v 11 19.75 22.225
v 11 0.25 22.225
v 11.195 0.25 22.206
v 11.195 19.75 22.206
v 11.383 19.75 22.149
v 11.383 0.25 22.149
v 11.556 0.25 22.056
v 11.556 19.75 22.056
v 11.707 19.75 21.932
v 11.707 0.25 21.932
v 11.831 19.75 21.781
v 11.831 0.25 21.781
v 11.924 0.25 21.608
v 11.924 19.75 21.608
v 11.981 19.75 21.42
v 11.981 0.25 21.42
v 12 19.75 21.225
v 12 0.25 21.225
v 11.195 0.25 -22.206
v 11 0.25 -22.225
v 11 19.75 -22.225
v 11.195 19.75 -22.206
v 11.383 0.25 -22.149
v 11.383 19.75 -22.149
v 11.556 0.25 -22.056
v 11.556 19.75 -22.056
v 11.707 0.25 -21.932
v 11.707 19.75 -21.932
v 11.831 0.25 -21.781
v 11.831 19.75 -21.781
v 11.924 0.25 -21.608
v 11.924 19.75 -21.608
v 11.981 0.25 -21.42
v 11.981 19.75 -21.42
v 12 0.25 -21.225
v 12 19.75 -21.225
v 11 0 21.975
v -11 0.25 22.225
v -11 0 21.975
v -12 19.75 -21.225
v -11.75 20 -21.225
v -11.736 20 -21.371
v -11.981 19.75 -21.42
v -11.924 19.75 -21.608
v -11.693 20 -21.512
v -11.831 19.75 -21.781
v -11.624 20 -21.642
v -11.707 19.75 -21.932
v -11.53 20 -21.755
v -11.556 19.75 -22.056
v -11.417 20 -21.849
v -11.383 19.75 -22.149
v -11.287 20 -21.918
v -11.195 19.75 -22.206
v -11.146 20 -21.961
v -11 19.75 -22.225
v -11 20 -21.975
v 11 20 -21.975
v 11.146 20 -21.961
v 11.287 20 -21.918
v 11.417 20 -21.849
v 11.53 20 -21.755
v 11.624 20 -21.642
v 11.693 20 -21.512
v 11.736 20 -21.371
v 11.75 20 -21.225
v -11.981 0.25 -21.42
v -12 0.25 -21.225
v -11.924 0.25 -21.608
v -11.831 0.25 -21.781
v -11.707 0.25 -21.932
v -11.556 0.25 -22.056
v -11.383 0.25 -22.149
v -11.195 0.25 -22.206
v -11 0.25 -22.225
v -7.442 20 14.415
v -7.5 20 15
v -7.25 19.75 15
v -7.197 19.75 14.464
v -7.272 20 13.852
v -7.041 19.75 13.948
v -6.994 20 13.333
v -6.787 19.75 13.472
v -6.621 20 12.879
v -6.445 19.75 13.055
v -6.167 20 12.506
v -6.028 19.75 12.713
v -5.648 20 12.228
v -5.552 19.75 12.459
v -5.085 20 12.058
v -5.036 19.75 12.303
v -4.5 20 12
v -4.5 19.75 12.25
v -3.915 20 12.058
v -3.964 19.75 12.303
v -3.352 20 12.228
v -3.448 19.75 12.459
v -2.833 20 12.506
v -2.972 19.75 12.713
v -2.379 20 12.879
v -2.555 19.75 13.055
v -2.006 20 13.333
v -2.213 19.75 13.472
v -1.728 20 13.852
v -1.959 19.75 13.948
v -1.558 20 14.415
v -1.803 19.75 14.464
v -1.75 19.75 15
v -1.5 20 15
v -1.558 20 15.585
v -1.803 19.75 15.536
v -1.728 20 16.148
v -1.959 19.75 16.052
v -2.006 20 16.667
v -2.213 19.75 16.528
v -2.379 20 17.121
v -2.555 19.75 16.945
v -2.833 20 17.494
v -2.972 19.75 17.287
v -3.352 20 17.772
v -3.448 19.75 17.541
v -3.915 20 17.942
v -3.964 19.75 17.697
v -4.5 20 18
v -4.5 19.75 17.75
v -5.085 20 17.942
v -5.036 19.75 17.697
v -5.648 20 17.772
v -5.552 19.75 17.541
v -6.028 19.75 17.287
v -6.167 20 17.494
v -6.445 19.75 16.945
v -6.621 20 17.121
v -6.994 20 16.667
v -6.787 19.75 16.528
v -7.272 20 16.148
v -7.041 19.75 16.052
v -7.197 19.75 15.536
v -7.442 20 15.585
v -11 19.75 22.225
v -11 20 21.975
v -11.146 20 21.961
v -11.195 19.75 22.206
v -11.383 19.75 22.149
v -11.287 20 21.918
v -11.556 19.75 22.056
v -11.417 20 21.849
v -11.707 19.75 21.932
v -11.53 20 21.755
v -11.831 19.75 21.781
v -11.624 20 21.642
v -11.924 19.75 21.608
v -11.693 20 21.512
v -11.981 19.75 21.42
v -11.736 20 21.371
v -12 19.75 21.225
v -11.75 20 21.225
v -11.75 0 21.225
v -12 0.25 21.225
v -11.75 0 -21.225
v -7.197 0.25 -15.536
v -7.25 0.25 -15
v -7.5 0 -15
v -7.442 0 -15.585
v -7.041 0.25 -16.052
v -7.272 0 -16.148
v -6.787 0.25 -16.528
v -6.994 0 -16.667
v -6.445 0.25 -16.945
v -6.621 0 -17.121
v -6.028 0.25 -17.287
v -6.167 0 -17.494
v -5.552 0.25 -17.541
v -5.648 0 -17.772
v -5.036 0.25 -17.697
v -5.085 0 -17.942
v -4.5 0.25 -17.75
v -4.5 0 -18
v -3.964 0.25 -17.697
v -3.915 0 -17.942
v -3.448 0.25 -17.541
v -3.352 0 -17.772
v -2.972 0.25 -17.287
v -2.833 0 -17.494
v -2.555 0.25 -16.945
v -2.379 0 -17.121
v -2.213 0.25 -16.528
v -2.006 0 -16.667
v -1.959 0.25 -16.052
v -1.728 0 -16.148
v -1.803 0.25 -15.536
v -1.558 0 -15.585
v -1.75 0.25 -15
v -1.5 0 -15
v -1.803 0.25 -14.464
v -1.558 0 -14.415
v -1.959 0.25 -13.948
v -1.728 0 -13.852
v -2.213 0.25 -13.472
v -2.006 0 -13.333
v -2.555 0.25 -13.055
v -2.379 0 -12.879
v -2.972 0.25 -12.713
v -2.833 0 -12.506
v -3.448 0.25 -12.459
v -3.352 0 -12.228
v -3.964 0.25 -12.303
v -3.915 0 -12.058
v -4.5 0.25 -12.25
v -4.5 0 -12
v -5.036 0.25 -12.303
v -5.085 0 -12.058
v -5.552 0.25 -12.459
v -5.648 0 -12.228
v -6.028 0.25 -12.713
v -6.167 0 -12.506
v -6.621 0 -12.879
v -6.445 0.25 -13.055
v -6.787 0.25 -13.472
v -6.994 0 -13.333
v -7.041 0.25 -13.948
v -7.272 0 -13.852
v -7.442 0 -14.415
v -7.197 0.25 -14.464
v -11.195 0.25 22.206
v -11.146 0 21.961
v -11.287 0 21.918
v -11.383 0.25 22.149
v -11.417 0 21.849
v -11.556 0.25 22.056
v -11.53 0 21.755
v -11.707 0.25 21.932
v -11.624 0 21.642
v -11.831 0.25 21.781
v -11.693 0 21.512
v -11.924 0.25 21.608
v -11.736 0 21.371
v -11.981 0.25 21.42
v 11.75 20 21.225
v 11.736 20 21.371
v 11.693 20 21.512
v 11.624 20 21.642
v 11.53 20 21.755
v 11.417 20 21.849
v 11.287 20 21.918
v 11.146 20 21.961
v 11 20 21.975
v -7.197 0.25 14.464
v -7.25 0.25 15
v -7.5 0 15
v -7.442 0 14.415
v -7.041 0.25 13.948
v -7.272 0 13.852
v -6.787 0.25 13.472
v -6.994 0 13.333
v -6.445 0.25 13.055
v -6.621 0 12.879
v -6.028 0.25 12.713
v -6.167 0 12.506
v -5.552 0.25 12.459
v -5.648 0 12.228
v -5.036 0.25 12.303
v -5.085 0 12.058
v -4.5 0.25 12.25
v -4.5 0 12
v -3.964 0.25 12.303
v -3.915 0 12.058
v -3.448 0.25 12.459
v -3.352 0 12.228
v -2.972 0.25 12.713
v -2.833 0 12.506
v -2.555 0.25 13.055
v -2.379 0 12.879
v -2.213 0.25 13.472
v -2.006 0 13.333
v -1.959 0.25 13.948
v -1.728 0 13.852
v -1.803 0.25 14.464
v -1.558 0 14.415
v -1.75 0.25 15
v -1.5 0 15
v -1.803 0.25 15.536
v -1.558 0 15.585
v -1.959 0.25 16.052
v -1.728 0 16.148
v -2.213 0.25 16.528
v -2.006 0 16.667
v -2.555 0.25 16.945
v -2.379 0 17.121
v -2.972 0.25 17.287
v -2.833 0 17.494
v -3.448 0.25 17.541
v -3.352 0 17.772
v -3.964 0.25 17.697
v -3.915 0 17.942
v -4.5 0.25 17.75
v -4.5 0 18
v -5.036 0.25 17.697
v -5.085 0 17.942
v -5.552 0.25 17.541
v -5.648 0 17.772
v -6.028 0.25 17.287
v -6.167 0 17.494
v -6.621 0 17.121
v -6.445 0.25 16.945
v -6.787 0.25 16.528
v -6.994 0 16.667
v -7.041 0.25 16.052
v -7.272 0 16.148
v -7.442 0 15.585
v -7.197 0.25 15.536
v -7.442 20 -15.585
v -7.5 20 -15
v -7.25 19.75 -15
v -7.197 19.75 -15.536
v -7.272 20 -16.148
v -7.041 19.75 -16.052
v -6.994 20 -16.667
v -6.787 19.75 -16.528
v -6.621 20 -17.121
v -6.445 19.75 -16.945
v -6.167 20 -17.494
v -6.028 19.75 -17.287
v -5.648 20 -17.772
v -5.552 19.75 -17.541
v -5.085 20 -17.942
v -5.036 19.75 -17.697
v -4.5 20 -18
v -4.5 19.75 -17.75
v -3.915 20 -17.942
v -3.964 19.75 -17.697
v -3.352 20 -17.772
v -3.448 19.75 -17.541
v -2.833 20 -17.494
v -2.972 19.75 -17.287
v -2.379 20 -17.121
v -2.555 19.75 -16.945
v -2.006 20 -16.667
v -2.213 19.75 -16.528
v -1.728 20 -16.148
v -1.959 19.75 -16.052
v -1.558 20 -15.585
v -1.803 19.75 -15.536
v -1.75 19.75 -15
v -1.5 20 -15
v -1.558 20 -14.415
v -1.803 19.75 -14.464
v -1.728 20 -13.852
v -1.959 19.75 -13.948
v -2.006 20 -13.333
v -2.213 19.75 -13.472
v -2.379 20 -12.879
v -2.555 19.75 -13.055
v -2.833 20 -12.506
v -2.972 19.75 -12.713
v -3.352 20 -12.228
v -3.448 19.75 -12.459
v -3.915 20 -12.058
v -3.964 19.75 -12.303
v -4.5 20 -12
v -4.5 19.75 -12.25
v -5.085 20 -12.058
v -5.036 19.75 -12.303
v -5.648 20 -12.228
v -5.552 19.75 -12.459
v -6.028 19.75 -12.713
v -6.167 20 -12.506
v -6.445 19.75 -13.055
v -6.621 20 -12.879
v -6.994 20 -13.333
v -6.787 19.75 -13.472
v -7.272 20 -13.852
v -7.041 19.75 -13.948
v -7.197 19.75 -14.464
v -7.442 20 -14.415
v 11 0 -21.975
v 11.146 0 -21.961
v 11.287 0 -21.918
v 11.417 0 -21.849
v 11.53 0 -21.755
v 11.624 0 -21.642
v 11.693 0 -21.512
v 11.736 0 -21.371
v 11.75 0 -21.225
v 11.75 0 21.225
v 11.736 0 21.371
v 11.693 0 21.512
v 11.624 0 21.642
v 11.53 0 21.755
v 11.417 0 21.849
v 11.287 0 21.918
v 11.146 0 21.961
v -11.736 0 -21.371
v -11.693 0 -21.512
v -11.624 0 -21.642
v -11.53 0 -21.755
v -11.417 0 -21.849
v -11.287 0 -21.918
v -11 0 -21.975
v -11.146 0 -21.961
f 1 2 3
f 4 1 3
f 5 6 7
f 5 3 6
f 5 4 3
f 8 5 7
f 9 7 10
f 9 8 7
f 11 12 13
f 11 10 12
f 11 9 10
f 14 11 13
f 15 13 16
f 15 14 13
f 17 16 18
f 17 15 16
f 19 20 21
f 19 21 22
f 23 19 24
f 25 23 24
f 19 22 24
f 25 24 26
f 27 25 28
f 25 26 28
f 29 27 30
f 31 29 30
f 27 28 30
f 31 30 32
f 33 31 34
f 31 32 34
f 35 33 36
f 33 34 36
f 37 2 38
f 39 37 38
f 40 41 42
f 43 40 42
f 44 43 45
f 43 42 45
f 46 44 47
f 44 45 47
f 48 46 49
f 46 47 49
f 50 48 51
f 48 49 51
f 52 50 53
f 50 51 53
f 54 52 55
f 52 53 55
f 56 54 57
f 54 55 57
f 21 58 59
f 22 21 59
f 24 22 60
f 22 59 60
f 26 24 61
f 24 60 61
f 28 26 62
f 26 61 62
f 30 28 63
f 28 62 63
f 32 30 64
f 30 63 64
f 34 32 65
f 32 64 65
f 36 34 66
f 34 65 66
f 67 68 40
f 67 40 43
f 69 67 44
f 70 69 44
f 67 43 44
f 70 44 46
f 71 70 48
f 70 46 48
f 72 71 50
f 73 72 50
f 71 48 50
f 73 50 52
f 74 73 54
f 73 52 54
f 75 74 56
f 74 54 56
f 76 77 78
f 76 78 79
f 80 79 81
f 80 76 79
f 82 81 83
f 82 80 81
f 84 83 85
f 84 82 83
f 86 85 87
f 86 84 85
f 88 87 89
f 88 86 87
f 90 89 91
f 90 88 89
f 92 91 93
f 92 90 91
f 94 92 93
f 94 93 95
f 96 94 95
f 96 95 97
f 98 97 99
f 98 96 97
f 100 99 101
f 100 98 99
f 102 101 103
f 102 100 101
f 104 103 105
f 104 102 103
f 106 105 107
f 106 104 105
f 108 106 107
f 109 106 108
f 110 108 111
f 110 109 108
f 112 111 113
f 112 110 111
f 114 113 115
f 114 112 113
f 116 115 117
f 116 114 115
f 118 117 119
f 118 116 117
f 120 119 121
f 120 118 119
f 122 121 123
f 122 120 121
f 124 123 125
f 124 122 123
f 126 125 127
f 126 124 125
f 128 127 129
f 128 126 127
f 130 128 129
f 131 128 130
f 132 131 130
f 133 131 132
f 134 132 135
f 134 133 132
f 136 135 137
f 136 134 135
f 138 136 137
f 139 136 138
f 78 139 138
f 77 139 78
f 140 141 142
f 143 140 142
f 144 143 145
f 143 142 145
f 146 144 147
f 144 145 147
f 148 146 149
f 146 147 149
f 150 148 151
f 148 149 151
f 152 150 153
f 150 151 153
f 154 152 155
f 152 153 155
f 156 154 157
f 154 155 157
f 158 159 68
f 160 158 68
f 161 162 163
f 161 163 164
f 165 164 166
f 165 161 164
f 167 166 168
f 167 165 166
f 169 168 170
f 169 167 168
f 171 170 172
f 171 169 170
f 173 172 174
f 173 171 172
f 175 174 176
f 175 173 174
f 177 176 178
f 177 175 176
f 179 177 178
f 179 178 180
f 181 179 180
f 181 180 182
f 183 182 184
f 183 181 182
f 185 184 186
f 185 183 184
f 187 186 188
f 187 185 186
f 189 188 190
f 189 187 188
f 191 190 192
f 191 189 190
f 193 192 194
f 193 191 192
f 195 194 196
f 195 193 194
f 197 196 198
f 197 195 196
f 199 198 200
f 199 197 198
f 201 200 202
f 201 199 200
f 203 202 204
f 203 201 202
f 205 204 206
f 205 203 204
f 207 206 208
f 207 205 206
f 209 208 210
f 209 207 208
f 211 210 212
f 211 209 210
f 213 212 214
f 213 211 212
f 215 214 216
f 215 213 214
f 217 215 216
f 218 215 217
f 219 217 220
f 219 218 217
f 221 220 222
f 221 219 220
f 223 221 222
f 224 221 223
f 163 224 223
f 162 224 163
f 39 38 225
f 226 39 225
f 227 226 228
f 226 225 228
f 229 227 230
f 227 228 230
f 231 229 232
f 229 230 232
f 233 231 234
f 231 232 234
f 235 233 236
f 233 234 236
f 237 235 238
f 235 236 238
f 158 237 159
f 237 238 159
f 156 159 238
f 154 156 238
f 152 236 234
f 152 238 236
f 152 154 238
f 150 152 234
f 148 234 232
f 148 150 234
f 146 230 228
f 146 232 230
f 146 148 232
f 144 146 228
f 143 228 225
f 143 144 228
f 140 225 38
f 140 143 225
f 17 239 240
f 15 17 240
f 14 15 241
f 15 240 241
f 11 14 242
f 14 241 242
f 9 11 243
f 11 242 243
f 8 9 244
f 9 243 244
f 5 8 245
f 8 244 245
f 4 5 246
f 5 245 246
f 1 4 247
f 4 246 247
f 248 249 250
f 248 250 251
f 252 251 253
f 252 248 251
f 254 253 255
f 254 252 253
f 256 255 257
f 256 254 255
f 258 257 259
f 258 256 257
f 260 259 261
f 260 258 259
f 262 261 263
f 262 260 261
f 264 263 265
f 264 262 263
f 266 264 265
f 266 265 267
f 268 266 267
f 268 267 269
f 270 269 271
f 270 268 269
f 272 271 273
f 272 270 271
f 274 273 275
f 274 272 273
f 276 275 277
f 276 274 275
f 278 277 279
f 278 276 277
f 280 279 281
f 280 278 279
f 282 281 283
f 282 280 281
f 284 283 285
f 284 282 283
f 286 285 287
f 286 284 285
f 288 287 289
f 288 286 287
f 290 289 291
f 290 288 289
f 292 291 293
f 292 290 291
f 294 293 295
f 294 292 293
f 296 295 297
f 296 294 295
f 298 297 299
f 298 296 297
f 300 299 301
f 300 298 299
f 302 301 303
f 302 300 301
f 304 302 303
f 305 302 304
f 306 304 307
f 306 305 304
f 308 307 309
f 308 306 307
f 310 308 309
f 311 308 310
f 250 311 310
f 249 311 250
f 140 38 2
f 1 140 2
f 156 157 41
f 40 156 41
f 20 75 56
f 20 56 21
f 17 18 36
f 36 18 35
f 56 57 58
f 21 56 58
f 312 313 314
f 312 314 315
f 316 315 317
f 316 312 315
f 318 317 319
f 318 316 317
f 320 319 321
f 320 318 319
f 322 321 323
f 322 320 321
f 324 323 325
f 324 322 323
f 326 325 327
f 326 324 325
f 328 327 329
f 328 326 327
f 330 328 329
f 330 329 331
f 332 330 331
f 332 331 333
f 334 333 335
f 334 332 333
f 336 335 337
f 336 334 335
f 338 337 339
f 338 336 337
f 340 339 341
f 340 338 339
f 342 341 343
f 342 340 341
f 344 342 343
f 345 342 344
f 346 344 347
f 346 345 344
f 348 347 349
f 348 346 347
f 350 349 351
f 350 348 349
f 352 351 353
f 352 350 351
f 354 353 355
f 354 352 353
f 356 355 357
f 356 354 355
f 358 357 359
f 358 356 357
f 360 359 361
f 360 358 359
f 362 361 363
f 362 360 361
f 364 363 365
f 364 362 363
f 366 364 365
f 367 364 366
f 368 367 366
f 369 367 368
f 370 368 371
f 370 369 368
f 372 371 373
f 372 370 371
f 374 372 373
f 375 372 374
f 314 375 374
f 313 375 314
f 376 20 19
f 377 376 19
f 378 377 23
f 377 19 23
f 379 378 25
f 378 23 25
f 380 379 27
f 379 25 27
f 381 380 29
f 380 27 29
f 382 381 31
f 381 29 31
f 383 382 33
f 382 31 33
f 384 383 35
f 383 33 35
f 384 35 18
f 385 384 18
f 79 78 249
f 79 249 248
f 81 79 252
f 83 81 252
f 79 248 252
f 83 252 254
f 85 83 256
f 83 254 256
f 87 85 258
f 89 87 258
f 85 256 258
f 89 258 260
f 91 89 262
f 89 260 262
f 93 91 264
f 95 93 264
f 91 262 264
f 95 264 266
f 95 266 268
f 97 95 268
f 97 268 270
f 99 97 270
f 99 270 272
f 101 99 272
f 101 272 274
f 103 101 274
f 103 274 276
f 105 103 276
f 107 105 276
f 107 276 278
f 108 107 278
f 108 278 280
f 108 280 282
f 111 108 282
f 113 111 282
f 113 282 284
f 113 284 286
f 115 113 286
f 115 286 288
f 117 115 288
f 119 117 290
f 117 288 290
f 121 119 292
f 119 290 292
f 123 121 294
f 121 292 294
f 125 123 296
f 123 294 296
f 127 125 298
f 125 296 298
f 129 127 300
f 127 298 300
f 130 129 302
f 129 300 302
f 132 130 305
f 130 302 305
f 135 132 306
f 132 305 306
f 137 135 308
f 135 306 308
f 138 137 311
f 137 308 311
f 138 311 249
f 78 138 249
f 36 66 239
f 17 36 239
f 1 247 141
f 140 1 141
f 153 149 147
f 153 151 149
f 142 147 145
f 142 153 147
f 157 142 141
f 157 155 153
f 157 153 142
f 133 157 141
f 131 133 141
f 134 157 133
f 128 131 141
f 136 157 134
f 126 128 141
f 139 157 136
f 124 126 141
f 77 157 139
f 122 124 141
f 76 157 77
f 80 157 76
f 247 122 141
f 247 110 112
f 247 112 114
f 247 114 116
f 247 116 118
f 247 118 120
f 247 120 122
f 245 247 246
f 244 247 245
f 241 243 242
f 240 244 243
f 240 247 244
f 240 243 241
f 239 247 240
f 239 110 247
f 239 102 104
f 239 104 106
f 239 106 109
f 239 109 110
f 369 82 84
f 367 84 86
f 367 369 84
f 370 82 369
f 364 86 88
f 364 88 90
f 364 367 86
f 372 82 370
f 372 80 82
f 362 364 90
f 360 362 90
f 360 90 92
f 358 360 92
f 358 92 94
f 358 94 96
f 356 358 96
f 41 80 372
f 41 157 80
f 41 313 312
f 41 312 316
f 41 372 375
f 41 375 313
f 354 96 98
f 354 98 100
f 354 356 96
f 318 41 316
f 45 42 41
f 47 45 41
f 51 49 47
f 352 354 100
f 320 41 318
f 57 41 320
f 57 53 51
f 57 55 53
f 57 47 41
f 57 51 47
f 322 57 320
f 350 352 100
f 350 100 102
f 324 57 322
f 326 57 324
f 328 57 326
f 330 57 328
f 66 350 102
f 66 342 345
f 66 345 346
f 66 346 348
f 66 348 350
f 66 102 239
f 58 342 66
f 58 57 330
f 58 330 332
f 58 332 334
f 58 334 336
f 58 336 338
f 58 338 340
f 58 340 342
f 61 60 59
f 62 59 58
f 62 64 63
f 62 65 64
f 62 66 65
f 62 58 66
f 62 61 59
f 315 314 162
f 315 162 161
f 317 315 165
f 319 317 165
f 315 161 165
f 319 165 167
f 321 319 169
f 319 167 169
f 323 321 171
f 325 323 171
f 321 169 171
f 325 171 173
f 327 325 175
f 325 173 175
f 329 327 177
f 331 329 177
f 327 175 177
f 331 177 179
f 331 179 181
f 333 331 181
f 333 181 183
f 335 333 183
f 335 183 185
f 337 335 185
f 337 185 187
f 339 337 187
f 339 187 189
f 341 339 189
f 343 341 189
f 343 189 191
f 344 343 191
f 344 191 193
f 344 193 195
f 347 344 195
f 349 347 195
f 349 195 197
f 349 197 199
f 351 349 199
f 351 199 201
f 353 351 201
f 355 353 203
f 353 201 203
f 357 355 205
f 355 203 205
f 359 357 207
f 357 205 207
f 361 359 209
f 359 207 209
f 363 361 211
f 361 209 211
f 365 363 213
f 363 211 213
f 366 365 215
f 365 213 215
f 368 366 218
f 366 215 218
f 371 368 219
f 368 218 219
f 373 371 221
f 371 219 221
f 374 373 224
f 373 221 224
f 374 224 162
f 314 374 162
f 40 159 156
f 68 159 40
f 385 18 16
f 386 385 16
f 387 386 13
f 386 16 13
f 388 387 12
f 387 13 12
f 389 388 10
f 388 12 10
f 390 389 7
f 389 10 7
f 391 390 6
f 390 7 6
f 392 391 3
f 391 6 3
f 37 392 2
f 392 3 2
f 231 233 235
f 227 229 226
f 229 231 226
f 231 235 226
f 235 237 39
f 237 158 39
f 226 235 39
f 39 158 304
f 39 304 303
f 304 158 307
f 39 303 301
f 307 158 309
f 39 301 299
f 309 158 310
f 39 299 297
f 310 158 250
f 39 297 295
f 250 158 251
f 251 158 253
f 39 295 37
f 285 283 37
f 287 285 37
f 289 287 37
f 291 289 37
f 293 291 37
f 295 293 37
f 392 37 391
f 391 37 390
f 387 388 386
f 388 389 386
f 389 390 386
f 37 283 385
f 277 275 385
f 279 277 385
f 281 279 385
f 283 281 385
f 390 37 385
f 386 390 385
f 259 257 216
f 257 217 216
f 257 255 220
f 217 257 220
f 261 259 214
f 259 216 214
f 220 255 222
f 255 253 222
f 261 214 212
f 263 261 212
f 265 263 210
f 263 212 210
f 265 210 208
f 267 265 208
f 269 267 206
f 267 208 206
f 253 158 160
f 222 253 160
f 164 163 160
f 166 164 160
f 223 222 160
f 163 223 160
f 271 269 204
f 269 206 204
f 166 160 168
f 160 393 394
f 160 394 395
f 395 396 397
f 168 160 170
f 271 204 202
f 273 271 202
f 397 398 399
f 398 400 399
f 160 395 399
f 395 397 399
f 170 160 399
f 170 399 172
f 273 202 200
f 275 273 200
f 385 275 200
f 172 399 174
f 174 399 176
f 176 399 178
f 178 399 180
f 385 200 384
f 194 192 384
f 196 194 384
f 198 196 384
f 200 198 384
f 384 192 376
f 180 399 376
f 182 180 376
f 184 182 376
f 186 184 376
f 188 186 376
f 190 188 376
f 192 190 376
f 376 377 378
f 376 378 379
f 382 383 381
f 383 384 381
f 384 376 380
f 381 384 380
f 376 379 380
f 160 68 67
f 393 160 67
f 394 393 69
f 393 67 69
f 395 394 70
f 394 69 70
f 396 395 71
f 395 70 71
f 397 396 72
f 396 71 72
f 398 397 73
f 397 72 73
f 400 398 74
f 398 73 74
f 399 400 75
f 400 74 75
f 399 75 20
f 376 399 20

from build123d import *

# Parameters (mm, degrees)
SKETCH1_W            = 24
SKETCH1_H            = 44.45
BOSS_EXTRUDE1_DEPTH  = 20
M5_CLEARANCE_HOLE1_D = 5.5
BOSS_EXTRUDE2_START  = -20
SKETCH4_R            = 2.75
BOSS_EXTRUDE2_DEPTH  = 20
FILLET1_R            = 1
CHAMFER1_SIZE        = 0.25


with BuildPart() as part:
    # Sketch1 → Boss-Extrude1 (new body)
    with BuildSketch(Plane(origin=(0, 0, 0), x_dir=(1, 0, 0), z_dir=(0, 1, 0))):
        Rectangle(SKETCH1_W, SKETCH1_H)
    extrude(amount=BOSS_EXTRUDE1_DEPTH)

    # M5 Clearance Hole1 (through all)
    with Locations(Plane(origin=(0, 20, 0), x_dir=(1, 0, 0), z_dir=(0, 1, 0))):
        with Locations((-4.5, 15), (-4.5, -15), (-4.5, 0)):
            Hole(M5_CLEARANCE_HOLE1_D / 2)

    # Sketch4 → Boss-Extrude2 (add)
    with BuildSketch(Plane(origin=(0, 20, 0), x_dir=(1, 0, 0), z_dir=(0, 1, 0)).offset(BOSS_EXTRUDE2_START)):
        with Locations((-4.5, 0)):
            Circle(SKETCH4_R)
    extrude(amount=BOSS_EXTRUDE2_DEPTH)

    # Fillet1
    fillet1_edges = [part.edges().sort_by_distance(p)[0] for p in [
        (-12, 10, -22.225),
        (12, 10, -22.225),
        (12, 10, 22.225),
        (-12, 10, 22.225),
    ]]
    fillet(fillet1_edges, radius=FILLET1_R)

    # Chamfer1
    chamfer1_edges = [part.edges().sort_by_distance(p)[0] for p in [
        (-1.75, 20, 15),
        (-1.75, 0, 15),
        (-1.75, 20, -15),
        (-1.75, 0, -15),
        (-12, 0, 0),
        (-12, 20, 0),
        (0, 0, -22.225),
        (12, 0, 0),
        (0, 0, 22.225),
        (-11.707106781, 0, 21.932106781),
        (11.707106781, 0, 21.932106781),
        (11.707106781, 0, -21.932106781),
        (-11.707106781, 0, -21.932106781),
        (0, 20, -22.225),
        (0, 20, 22.225),
        (12, 20, 0),
        (-11.707106781, 20, 21.932106781),
        (11.707106781, 20, 21.932106781),
        (11.707106781, 20, -21.932106781),
        (-11.707106781, 20, -21.932106781),
    ]]
    chamfer(chamfer1_edges, length=CHAMFER1_SIZE)


solid = part.part
